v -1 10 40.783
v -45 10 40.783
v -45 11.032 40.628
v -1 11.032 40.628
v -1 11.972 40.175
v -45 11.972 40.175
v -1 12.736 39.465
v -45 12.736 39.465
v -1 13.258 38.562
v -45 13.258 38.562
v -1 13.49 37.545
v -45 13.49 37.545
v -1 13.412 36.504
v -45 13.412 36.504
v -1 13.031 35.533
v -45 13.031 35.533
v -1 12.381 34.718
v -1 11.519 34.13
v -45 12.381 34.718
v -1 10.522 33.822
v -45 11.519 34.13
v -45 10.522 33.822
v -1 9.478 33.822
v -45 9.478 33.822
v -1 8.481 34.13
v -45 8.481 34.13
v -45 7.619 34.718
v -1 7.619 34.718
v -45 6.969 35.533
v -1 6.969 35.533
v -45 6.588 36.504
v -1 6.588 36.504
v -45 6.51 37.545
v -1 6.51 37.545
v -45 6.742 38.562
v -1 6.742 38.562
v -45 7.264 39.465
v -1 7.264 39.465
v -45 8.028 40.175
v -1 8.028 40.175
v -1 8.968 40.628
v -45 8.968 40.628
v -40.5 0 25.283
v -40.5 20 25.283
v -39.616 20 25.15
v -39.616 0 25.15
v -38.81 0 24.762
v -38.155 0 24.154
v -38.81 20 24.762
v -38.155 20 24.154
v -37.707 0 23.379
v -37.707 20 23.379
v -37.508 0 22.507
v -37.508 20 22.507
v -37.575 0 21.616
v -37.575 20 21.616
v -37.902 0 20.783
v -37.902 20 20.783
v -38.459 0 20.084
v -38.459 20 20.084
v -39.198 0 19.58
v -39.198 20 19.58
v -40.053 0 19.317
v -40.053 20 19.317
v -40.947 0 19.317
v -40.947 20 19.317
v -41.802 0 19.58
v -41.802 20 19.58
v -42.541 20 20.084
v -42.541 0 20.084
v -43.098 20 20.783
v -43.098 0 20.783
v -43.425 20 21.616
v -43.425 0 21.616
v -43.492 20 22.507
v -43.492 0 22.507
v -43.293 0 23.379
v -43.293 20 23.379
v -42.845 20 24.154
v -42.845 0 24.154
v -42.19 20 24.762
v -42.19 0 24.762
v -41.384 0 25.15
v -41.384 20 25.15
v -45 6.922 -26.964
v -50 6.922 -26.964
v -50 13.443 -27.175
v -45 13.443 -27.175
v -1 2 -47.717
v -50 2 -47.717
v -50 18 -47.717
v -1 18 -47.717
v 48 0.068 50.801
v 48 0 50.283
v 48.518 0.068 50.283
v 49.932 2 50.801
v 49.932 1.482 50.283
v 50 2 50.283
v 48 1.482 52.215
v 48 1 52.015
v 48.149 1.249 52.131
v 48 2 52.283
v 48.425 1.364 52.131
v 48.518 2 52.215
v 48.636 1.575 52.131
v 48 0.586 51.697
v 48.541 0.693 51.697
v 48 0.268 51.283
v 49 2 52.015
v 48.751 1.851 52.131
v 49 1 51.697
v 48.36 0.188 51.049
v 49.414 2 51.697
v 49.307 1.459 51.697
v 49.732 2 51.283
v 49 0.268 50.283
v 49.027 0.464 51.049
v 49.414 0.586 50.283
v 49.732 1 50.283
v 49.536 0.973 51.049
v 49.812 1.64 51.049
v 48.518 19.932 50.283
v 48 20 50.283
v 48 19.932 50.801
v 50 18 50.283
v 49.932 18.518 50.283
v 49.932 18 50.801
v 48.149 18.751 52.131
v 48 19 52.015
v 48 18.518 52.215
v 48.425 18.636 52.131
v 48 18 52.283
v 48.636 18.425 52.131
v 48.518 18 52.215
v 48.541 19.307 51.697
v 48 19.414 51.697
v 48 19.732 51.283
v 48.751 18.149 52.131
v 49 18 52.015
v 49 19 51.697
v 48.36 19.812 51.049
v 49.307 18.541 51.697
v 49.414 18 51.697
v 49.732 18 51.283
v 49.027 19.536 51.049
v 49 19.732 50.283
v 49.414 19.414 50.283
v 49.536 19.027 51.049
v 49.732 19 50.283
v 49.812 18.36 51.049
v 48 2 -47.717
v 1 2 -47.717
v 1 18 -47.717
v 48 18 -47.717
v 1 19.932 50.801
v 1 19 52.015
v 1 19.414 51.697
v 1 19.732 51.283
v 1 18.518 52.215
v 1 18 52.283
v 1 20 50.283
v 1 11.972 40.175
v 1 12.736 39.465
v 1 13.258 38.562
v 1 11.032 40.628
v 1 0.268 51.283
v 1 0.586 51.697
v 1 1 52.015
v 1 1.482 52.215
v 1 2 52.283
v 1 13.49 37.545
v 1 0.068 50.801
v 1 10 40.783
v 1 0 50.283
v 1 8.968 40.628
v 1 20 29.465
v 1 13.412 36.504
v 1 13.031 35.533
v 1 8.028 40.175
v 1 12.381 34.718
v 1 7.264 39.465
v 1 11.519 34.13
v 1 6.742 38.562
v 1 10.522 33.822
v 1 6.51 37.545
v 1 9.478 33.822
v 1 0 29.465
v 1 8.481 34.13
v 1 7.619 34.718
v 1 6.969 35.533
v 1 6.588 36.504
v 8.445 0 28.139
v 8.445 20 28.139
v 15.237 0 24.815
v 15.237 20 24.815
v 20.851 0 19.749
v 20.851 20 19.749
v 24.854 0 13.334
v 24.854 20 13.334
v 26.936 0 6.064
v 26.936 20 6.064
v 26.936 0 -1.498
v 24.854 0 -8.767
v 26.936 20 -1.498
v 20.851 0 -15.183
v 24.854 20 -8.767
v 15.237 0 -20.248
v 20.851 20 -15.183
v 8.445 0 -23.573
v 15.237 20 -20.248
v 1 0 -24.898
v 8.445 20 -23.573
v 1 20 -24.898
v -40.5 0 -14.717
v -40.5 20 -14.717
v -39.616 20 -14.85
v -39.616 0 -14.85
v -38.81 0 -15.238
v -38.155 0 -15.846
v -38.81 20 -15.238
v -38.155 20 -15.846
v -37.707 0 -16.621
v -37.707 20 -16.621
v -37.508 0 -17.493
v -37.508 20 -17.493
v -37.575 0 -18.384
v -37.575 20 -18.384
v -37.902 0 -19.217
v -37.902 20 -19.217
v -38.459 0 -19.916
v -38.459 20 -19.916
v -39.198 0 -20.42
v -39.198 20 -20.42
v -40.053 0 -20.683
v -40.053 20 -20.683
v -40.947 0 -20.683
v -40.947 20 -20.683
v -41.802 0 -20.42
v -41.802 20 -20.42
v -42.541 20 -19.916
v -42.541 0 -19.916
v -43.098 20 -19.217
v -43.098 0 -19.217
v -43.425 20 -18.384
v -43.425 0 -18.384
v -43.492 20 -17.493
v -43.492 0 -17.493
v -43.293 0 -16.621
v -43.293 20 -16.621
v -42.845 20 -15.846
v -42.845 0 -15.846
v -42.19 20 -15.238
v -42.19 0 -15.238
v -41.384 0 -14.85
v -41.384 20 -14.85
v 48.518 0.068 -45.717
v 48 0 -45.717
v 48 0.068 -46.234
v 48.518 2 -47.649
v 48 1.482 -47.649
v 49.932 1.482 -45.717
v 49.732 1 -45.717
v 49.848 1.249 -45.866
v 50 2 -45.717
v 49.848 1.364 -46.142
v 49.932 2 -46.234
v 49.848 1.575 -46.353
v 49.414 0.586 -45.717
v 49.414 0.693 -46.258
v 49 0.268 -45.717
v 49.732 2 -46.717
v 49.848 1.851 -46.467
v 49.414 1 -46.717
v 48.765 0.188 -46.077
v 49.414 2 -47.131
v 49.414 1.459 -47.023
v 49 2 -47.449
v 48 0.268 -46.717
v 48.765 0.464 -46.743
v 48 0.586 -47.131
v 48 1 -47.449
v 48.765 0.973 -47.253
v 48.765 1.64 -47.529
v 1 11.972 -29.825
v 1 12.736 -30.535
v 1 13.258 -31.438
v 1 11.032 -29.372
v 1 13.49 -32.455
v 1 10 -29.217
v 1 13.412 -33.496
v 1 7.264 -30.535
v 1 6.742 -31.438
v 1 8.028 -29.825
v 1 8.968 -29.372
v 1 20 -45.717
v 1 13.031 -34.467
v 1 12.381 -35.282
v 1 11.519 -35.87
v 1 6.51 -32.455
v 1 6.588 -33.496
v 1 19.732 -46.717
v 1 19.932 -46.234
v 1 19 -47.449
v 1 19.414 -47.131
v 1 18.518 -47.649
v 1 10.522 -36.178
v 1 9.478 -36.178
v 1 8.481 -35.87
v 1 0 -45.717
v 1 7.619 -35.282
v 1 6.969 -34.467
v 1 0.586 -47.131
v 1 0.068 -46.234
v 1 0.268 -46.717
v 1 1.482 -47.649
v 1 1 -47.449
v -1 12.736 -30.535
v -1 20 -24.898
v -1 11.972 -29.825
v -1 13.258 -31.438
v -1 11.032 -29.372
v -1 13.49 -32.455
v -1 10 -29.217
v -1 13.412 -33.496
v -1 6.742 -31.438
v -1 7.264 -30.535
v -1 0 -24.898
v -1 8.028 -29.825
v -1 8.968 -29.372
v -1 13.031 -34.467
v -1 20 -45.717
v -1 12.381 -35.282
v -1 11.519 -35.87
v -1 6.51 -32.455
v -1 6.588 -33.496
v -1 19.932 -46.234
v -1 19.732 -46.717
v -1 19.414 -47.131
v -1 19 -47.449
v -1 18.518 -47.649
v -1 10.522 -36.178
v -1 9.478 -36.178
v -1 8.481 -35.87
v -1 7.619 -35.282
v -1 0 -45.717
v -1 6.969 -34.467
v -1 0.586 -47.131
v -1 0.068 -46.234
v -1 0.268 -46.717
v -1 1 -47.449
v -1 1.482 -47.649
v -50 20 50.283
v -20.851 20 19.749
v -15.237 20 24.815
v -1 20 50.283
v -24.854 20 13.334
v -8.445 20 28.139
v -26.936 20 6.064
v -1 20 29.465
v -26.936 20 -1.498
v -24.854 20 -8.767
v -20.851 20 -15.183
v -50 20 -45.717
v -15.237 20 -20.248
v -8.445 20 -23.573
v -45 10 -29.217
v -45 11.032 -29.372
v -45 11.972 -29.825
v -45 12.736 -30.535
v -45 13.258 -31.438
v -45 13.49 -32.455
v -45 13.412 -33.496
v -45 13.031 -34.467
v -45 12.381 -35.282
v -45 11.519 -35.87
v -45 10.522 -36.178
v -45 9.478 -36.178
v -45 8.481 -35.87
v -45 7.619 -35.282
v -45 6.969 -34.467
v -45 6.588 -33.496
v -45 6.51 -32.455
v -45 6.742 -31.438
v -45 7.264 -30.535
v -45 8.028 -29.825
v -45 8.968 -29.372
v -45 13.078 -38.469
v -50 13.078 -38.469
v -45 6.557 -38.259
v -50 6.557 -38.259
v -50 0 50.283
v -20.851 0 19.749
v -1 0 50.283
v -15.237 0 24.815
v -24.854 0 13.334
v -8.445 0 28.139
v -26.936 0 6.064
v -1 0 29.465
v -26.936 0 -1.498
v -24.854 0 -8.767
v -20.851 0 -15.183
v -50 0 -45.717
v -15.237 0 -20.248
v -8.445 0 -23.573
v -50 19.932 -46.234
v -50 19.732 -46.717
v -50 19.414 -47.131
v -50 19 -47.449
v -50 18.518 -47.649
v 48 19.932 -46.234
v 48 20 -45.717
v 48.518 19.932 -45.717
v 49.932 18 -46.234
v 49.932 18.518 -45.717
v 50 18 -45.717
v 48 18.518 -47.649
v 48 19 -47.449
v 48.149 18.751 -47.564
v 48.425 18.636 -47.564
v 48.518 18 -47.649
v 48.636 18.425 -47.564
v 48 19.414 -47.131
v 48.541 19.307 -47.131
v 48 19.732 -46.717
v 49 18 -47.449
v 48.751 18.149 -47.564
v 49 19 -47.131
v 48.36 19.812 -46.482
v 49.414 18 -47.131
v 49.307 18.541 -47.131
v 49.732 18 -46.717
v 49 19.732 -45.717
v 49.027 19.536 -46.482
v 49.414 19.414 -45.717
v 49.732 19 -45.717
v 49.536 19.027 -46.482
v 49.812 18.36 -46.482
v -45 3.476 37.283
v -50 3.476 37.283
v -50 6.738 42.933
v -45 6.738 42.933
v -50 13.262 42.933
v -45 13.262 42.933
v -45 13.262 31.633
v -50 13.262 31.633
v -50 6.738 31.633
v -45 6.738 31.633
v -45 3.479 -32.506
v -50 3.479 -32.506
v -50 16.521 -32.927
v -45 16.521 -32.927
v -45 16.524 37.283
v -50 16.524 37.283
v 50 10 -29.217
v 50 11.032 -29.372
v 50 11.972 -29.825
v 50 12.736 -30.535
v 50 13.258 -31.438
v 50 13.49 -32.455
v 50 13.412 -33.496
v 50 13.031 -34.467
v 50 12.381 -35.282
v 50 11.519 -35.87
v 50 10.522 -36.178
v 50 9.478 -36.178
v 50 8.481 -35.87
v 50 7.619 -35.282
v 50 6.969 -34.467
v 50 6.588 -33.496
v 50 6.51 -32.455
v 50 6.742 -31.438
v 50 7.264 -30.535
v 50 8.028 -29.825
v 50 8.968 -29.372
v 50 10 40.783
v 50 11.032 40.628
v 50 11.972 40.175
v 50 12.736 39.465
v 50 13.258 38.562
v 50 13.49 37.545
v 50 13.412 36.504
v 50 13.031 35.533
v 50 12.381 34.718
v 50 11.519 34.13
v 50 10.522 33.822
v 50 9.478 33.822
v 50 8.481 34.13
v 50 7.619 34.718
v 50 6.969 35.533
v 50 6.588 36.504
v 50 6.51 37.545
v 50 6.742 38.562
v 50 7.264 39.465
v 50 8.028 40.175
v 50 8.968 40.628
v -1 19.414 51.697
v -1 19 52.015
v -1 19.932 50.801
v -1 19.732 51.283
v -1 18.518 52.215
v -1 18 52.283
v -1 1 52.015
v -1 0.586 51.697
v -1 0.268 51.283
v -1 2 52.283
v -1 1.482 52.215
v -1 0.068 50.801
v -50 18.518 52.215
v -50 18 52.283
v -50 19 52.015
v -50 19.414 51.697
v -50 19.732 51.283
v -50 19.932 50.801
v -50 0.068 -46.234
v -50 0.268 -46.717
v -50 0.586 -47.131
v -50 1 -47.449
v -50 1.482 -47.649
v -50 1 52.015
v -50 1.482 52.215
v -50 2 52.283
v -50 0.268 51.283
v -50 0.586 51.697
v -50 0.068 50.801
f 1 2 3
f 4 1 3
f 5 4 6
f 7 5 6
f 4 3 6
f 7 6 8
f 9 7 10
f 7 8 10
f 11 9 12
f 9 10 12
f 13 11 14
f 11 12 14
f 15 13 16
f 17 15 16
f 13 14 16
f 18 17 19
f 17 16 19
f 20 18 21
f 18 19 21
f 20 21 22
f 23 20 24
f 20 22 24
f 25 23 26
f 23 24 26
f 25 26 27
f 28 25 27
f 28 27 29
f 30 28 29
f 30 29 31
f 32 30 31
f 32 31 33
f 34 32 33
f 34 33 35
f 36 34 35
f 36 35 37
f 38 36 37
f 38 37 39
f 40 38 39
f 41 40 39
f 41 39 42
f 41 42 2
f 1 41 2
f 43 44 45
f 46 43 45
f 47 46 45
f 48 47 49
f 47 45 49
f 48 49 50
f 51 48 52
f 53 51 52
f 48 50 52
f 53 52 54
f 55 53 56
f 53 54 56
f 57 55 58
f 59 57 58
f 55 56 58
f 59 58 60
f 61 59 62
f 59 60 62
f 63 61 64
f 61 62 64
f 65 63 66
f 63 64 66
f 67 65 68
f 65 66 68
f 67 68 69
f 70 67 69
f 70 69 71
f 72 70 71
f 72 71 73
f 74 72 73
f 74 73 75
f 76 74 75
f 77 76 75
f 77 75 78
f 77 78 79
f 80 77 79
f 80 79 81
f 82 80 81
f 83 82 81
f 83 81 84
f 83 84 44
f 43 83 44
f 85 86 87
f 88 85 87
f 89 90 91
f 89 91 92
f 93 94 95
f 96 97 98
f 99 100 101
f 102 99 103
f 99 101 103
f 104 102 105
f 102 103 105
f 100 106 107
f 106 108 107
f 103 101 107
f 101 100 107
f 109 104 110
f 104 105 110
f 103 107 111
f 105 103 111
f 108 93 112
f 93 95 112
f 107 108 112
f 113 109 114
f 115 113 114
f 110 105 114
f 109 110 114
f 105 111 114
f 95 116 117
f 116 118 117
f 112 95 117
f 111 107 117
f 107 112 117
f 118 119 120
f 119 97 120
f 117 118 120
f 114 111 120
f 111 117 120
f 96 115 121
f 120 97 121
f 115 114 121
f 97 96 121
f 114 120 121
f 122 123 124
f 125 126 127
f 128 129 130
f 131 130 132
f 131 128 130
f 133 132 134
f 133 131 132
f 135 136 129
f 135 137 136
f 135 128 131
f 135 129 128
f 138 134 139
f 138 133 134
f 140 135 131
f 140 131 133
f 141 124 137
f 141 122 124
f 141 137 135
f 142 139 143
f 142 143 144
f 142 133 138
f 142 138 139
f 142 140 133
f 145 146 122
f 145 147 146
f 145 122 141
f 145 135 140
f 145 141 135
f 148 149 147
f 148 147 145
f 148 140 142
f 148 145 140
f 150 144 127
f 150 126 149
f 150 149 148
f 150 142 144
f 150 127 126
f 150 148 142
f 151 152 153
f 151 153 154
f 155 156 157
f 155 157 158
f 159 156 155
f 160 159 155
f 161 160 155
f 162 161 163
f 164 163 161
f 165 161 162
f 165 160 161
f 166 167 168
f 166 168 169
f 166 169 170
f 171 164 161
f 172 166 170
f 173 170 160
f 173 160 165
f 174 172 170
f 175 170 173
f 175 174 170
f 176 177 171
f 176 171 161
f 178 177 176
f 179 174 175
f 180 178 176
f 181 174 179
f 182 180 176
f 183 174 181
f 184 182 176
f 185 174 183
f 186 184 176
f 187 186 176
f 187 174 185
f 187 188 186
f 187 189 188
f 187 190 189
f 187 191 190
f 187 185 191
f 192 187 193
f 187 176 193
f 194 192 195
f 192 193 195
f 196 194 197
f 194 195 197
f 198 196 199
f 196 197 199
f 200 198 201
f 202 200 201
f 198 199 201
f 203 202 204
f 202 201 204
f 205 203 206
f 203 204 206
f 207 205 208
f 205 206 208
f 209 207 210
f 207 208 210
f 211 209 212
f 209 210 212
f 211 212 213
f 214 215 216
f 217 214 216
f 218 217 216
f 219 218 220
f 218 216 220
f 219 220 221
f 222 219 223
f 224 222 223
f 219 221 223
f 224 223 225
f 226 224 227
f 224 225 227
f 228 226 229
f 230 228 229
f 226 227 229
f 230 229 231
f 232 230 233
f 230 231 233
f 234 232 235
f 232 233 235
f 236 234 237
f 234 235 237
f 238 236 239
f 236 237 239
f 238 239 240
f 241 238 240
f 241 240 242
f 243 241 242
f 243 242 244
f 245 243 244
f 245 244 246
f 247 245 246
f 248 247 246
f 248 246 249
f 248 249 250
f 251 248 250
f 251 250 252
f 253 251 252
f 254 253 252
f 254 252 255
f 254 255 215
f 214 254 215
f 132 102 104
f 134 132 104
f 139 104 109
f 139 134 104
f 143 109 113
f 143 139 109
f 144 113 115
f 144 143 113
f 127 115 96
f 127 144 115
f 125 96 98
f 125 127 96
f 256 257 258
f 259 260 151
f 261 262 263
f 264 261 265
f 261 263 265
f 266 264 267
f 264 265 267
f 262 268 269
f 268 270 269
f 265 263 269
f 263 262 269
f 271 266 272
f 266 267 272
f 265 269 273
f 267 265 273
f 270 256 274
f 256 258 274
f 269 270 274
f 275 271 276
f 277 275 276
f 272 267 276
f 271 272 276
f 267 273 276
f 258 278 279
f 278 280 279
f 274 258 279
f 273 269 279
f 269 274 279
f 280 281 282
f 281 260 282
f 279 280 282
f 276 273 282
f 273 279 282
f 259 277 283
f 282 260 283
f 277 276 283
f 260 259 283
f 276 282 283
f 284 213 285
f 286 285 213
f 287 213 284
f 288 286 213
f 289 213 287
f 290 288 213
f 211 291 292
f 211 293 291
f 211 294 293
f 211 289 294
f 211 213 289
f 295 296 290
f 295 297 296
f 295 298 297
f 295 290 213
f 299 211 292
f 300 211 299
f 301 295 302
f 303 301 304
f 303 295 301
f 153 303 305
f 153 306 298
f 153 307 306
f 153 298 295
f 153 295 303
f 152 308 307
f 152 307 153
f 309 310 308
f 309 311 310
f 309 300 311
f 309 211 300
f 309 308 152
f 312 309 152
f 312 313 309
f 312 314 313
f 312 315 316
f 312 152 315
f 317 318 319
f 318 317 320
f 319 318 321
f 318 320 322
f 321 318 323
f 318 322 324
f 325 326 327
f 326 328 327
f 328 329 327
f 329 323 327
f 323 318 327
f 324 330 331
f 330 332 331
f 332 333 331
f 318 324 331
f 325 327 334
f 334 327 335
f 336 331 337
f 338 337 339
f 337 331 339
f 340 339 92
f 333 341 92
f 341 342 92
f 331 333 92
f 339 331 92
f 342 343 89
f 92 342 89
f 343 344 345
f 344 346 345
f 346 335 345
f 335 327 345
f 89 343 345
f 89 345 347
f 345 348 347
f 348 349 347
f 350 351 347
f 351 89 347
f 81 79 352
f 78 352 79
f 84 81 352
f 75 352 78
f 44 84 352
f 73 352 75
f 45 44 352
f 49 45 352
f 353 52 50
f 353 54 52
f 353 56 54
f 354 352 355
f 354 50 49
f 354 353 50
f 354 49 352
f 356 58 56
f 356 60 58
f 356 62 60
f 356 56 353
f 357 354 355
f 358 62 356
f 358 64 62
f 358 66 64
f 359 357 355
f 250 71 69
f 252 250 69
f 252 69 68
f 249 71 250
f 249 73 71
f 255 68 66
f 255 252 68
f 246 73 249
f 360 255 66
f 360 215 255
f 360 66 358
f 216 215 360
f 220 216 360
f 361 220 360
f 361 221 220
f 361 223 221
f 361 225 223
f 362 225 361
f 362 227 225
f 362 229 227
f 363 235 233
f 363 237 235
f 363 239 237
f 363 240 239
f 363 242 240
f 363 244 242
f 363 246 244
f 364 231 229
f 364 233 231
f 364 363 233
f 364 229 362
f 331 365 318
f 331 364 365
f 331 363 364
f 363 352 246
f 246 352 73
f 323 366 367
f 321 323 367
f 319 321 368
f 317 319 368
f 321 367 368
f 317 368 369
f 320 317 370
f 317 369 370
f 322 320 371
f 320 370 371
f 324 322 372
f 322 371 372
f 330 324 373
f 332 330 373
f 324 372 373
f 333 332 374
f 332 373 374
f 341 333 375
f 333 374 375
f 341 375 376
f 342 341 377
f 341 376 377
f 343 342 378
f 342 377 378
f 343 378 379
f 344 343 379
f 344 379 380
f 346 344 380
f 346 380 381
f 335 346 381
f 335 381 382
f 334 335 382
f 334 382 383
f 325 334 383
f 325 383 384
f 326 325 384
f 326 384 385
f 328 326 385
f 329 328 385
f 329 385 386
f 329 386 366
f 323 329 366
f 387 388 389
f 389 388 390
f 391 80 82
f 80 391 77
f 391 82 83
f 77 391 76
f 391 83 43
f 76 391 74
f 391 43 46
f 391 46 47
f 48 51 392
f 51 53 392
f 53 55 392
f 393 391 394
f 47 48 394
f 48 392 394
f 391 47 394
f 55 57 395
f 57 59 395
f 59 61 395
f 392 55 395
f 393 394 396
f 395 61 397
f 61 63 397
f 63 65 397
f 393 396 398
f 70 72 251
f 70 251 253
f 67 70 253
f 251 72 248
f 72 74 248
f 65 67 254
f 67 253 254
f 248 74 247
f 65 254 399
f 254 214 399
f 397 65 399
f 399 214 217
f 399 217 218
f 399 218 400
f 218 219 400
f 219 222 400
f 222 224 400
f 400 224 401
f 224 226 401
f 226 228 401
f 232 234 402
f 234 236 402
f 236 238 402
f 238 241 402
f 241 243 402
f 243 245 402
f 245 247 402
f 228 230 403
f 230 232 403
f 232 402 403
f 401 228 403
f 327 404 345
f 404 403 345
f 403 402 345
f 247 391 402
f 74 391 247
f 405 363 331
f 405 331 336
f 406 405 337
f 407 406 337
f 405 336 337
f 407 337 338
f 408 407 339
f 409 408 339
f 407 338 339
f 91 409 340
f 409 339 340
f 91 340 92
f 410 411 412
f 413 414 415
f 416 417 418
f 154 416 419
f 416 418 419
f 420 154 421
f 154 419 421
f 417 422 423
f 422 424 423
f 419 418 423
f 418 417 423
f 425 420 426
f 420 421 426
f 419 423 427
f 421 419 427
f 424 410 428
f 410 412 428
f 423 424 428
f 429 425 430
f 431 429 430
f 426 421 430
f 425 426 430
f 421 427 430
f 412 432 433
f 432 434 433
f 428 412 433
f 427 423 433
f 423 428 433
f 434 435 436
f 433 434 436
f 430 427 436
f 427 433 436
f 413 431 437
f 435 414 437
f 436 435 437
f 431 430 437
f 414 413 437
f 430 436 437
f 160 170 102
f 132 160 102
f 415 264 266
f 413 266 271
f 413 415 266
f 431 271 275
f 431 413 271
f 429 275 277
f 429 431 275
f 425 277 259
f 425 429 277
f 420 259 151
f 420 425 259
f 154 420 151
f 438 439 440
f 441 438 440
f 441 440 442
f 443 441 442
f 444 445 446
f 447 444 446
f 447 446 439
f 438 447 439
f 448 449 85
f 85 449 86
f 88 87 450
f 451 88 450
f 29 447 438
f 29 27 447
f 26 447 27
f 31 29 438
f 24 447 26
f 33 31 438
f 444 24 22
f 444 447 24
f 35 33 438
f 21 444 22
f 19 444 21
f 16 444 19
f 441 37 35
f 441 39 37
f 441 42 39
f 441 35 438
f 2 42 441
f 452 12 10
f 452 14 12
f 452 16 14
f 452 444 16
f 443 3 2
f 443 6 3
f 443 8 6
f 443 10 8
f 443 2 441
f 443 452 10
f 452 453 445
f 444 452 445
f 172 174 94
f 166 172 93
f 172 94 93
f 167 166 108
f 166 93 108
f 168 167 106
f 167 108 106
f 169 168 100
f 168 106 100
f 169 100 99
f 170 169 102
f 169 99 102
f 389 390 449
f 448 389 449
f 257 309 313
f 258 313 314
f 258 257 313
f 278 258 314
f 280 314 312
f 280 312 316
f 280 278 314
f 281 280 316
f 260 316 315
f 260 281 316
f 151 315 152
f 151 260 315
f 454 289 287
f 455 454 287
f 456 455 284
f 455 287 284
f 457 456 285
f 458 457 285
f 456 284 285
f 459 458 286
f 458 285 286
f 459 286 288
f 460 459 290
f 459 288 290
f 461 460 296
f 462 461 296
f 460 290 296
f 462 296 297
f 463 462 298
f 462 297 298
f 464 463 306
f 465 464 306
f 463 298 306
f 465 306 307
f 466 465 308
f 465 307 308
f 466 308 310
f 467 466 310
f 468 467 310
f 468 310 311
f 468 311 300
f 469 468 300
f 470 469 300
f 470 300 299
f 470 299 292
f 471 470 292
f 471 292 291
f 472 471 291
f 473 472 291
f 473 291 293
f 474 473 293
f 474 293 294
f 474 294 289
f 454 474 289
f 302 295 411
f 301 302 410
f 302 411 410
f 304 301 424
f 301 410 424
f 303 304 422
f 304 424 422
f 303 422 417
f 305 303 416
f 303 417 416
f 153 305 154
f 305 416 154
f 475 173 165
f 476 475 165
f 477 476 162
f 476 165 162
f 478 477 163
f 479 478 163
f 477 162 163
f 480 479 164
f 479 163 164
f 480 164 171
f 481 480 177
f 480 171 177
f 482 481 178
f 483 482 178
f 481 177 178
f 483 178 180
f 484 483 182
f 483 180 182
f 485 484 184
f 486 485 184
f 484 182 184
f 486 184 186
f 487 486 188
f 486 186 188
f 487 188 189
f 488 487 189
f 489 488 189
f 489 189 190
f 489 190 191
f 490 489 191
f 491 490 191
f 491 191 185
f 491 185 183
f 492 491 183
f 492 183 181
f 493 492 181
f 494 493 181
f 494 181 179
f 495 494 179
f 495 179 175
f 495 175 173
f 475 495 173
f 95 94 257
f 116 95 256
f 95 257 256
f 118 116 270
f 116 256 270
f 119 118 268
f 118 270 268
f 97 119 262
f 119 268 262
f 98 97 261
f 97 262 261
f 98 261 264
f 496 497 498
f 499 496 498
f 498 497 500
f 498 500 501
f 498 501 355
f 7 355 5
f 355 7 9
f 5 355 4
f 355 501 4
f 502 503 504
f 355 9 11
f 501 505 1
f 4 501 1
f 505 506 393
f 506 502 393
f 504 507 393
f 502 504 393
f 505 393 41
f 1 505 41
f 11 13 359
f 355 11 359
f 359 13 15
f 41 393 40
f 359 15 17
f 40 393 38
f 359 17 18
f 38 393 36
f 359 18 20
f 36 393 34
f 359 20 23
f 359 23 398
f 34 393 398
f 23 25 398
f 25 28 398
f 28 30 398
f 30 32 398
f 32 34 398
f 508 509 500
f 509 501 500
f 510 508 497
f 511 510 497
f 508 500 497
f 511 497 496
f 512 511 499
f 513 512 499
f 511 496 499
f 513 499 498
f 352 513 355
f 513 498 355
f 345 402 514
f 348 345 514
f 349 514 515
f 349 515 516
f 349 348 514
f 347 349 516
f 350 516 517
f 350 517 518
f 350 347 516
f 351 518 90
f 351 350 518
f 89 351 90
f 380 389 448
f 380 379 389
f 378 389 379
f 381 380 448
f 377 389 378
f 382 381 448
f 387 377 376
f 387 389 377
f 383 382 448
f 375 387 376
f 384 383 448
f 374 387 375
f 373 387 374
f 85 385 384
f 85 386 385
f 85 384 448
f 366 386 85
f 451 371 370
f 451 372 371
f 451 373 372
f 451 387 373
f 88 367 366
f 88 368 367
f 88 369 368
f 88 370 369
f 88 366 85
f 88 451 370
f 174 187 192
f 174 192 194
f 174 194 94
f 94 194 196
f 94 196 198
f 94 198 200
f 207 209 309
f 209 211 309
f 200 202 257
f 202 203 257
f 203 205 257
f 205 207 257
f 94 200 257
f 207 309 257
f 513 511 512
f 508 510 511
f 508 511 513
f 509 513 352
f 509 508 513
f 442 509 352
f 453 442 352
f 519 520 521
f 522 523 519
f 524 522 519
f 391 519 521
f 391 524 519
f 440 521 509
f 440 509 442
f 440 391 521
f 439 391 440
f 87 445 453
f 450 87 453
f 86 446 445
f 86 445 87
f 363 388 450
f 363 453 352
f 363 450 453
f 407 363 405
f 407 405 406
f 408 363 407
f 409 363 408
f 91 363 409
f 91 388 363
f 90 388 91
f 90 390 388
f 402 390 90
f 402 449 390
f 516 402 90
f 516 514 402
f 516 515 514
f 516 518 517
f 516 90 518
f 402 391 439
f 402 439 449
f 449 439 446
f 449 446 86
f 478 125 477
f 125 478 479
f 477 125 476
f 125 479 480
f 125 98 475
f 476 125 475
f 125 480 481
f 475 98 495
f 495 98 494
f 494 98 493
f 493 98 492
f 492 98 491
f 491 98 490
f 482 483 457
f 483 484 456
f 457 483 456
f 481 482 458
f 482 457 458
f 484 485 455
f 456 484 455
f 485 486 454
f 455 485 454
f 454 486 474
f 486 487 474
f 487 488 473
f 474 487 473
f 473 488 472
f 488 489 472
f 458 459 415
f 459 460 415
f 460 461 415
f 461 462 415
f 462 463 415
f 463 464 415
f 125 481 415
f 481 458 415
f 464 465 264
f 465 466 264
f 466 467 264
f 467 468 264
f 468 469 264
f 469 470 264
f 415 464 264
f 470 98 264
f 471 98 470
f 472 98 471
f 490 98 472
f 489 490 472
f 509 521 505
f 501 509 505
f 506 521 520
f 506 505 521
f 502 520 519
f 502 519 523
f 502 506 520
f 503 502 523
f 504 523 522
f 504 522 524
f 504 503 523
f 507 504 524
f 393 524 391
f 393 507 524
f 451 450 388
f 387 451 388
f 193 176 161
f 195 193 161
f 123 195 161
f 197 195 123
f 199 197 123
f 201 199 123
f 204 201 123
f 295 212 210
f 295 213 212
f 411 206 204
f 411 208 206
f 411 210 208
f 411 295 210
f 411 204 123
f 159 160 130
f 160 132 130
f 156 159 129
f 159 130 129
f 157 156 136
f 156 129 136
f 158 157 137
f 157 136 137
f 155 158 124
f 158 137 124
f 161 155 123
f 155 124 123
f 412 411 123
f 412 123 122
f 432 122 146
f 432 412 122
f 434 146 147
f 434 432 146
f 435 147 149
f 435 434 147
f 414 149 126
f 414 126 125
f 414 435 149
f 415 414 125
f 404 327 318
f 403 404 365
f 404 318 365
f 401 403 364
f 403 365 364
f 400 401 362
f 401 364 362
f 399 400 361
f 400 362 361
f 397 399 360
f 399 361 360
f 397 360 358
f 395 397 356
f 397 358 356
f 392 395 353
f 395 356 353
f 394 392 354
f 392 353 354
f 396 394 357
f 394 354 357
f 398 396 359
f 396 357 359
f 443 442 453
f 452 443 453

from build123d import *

# Parameters (mm, degrees)
ESQUISSE1_W             = 49
ESQUISSE1_H             = 100
BOSS_EXTRU_1_DEPTH      = 20
ESQUISSE2_W             = 49
ESQUISSE2_H             = 100
BOSS_EXTRU_2_DEPTH      = 20
ESQUISSE3_R             = 27.2
ENL_V_MAT_EXTRU_1_DEPTH = 76.056920996
ESQUISSE4_R             = 3.5
ENL_V_MAT_EXTRU_2_DEPTH = 115.60166399
ESQUISSE5_R             = 3
ENL_V_MAT_EXTRU_3_DEPTH = 76.056920996
ENL_V_MAT_EXTRU_5_DEPTH = 5
CONG_1_R                = 2
CONG_2_R                = 2


with BuildPart() as part:
    # Esquisse1 → Boss.-Extru.1 (new body)
    with BuildSketch(Plane(origin=(0, 0, 0), x_dir=(1, 0, 0), z_dir=(0, 1, 0))):
        with Locations((25.5, -2.283280209)):
            Rectangle(ESQUISSE1_W, ESQUISSE1_H)
    extrude(amount=BOSS_EXTRU_1_DEPTH)


with BuildPart() as body_2:
    # Esquisse2 → Boss.-Extru.2 (new body)
    with BuildSketch(Plane(origin=(0, 0, 0), x_dir=(1, 0, 0), z_dir=(0, 1, 0))):
        with Locations((-25.5, -2.283280209)):
            Rectangle(ESQUISSE2_W, ESQUISSE2_H)
    extrude(amount=BOSS_EXTRU_2_DEPTH)


with BuildPart() as enl_v_mat_extru_1_tool:
    # Esquisse3 → Enlèv. mat.-Extru.1 (new, through all)
    with BuildSketch(Plane(origin=(0, 20, 0), x_dir=(1, 0, 0), z_dir=(0, 1, 0))):
        with Locations((0, -2.283280209)):
            Circle(ESQUISSE3_R)
    extrude(amount=-ENL_V_MAT_EXTRU_1_DEPTH)


with BuildPart() as part_1:
    add(part.part)

    # Enlèv. mat.-Extru.1: cut by enl_v_mat_extru_1_tool
    add(enl_v_mat_extru_1_tool.part, mode=Mode.SUBTRACT)


with BuildPart() as body_2_1:
    add(body_2.part)

    # Enlèv. mat.-Extru.1: cut by enl_v_mat_extru_1_tool
    add(enl_v_mat_extru_1_tool.part, mode=Mode.SUBTRACT)


with BuildPart() as enl_v_mat_extru_2_tool:
    # Esquisse4 → Enlèv. mat.-Extru.2 (new, through all)
    with BuildSketch(Plane.ZY.offset(50)):
        with Locations((-32.716719791, 10)):
            Circle(ESQUISSE4_R)
        with Locations((37.283280209, 10)):
            Circle(ESQUISSE4_R)
    extrude(amount=-ENL_V_MAT_EXTRU_2_DEPTH)


with BuildPart() as part_2:
    add(part_1.part)

    # Enlèv. mat.-Extru.2: cut by enl_v_mat_extru_2_tool
    add(enl_v_mat_extru_2_tool.part, mode=Mode.SUBTRACT)

    # Congé2
    cong_2_edges = [part_2.edges().sort_by_distance(p)[0] for p in [
        (50, 20, 2.283280209),
        (25.5, 20, -47.716719791),
        (25.5, 0, -47.716719791),
        (50, 0, 2.283280209),
        (25.5, 0, 52.283280209),
        (25.5, 20, 52.283280209),
        (50, 10, -47.716719791),
        (50, 10, 52.283280209),
    ]]
    fillet(cong_2_edges, radius=CONG_2_R)


with BuildPart() as body_2_2:
    add(body_2_1.part)

    # Enlèv. mat.-Extru.2: cut by enl_v_mat_extru_2_tool
    add(enl_v_mat_extru_2_tool.part, mode=Mode.SUBTRACT)

    # Esquisse5 → Enlèv. mat.-Extru.3 (cut, through all)
    with BuildSketch(Plane(origin=(0, 20, 0), x_dir=(1, 0, 0), z_dir=(0, 1, 0))):
        with Locations(Location((-40.5, 17.716719791, 0), (0, 0, 270))):
            Circle(ESQUISSE5_R)
        with Locations(Location((-40.5, -22.283280209, 0), (0, 0, 270))):
            Circle(ESQUISSE5_R)
    extrude(amount=-ENL_V_MAT_EXTRU_3_DEPTH, mode=Mode.SUBTRACT)

    # Esquisse7 → Enlèv. mat.-Extru.5 (cut)
    with BuildSketch(Plane.ZY.offset(50)):
        Polygon((-26.964408073, 6.921974135), (-27.174915339, 13.442635146), (-32.927227058, 16.520661011), (-38.46903151, 13.078025865), (-38.258524244, 6.557364854), (-32.506212525, 3.479338989), align=None)
        Polygon((37.283280209, 3.475941958), (42.933280209, 6.737970979), (42.933280209, 13.262029021), (37.283280209, 16.524058042), (31.633280209, 13.262029021), (31.633280209, 6.737970979), align=None)
    extrude(amount=-ENL_V_MAT_EXTRU_5_DEPTH, mode=Mode.SUBTRACT)

    # Congé1
    cong_1_edges = [body_2_2.edges().sort_by_distance(p)[0] for p in [
        (-25.5, 20, 52.283280209),
        (-25.5, 20, -47.716719791),
        (-25.5, 0, 52.283280209),
        (-25.5, 0, -47.716719791),
    ]]
    fillet(cong_1_edges, radius=CONG_1_R)


solid = Compound([part_2.part, body_2_2.part])
